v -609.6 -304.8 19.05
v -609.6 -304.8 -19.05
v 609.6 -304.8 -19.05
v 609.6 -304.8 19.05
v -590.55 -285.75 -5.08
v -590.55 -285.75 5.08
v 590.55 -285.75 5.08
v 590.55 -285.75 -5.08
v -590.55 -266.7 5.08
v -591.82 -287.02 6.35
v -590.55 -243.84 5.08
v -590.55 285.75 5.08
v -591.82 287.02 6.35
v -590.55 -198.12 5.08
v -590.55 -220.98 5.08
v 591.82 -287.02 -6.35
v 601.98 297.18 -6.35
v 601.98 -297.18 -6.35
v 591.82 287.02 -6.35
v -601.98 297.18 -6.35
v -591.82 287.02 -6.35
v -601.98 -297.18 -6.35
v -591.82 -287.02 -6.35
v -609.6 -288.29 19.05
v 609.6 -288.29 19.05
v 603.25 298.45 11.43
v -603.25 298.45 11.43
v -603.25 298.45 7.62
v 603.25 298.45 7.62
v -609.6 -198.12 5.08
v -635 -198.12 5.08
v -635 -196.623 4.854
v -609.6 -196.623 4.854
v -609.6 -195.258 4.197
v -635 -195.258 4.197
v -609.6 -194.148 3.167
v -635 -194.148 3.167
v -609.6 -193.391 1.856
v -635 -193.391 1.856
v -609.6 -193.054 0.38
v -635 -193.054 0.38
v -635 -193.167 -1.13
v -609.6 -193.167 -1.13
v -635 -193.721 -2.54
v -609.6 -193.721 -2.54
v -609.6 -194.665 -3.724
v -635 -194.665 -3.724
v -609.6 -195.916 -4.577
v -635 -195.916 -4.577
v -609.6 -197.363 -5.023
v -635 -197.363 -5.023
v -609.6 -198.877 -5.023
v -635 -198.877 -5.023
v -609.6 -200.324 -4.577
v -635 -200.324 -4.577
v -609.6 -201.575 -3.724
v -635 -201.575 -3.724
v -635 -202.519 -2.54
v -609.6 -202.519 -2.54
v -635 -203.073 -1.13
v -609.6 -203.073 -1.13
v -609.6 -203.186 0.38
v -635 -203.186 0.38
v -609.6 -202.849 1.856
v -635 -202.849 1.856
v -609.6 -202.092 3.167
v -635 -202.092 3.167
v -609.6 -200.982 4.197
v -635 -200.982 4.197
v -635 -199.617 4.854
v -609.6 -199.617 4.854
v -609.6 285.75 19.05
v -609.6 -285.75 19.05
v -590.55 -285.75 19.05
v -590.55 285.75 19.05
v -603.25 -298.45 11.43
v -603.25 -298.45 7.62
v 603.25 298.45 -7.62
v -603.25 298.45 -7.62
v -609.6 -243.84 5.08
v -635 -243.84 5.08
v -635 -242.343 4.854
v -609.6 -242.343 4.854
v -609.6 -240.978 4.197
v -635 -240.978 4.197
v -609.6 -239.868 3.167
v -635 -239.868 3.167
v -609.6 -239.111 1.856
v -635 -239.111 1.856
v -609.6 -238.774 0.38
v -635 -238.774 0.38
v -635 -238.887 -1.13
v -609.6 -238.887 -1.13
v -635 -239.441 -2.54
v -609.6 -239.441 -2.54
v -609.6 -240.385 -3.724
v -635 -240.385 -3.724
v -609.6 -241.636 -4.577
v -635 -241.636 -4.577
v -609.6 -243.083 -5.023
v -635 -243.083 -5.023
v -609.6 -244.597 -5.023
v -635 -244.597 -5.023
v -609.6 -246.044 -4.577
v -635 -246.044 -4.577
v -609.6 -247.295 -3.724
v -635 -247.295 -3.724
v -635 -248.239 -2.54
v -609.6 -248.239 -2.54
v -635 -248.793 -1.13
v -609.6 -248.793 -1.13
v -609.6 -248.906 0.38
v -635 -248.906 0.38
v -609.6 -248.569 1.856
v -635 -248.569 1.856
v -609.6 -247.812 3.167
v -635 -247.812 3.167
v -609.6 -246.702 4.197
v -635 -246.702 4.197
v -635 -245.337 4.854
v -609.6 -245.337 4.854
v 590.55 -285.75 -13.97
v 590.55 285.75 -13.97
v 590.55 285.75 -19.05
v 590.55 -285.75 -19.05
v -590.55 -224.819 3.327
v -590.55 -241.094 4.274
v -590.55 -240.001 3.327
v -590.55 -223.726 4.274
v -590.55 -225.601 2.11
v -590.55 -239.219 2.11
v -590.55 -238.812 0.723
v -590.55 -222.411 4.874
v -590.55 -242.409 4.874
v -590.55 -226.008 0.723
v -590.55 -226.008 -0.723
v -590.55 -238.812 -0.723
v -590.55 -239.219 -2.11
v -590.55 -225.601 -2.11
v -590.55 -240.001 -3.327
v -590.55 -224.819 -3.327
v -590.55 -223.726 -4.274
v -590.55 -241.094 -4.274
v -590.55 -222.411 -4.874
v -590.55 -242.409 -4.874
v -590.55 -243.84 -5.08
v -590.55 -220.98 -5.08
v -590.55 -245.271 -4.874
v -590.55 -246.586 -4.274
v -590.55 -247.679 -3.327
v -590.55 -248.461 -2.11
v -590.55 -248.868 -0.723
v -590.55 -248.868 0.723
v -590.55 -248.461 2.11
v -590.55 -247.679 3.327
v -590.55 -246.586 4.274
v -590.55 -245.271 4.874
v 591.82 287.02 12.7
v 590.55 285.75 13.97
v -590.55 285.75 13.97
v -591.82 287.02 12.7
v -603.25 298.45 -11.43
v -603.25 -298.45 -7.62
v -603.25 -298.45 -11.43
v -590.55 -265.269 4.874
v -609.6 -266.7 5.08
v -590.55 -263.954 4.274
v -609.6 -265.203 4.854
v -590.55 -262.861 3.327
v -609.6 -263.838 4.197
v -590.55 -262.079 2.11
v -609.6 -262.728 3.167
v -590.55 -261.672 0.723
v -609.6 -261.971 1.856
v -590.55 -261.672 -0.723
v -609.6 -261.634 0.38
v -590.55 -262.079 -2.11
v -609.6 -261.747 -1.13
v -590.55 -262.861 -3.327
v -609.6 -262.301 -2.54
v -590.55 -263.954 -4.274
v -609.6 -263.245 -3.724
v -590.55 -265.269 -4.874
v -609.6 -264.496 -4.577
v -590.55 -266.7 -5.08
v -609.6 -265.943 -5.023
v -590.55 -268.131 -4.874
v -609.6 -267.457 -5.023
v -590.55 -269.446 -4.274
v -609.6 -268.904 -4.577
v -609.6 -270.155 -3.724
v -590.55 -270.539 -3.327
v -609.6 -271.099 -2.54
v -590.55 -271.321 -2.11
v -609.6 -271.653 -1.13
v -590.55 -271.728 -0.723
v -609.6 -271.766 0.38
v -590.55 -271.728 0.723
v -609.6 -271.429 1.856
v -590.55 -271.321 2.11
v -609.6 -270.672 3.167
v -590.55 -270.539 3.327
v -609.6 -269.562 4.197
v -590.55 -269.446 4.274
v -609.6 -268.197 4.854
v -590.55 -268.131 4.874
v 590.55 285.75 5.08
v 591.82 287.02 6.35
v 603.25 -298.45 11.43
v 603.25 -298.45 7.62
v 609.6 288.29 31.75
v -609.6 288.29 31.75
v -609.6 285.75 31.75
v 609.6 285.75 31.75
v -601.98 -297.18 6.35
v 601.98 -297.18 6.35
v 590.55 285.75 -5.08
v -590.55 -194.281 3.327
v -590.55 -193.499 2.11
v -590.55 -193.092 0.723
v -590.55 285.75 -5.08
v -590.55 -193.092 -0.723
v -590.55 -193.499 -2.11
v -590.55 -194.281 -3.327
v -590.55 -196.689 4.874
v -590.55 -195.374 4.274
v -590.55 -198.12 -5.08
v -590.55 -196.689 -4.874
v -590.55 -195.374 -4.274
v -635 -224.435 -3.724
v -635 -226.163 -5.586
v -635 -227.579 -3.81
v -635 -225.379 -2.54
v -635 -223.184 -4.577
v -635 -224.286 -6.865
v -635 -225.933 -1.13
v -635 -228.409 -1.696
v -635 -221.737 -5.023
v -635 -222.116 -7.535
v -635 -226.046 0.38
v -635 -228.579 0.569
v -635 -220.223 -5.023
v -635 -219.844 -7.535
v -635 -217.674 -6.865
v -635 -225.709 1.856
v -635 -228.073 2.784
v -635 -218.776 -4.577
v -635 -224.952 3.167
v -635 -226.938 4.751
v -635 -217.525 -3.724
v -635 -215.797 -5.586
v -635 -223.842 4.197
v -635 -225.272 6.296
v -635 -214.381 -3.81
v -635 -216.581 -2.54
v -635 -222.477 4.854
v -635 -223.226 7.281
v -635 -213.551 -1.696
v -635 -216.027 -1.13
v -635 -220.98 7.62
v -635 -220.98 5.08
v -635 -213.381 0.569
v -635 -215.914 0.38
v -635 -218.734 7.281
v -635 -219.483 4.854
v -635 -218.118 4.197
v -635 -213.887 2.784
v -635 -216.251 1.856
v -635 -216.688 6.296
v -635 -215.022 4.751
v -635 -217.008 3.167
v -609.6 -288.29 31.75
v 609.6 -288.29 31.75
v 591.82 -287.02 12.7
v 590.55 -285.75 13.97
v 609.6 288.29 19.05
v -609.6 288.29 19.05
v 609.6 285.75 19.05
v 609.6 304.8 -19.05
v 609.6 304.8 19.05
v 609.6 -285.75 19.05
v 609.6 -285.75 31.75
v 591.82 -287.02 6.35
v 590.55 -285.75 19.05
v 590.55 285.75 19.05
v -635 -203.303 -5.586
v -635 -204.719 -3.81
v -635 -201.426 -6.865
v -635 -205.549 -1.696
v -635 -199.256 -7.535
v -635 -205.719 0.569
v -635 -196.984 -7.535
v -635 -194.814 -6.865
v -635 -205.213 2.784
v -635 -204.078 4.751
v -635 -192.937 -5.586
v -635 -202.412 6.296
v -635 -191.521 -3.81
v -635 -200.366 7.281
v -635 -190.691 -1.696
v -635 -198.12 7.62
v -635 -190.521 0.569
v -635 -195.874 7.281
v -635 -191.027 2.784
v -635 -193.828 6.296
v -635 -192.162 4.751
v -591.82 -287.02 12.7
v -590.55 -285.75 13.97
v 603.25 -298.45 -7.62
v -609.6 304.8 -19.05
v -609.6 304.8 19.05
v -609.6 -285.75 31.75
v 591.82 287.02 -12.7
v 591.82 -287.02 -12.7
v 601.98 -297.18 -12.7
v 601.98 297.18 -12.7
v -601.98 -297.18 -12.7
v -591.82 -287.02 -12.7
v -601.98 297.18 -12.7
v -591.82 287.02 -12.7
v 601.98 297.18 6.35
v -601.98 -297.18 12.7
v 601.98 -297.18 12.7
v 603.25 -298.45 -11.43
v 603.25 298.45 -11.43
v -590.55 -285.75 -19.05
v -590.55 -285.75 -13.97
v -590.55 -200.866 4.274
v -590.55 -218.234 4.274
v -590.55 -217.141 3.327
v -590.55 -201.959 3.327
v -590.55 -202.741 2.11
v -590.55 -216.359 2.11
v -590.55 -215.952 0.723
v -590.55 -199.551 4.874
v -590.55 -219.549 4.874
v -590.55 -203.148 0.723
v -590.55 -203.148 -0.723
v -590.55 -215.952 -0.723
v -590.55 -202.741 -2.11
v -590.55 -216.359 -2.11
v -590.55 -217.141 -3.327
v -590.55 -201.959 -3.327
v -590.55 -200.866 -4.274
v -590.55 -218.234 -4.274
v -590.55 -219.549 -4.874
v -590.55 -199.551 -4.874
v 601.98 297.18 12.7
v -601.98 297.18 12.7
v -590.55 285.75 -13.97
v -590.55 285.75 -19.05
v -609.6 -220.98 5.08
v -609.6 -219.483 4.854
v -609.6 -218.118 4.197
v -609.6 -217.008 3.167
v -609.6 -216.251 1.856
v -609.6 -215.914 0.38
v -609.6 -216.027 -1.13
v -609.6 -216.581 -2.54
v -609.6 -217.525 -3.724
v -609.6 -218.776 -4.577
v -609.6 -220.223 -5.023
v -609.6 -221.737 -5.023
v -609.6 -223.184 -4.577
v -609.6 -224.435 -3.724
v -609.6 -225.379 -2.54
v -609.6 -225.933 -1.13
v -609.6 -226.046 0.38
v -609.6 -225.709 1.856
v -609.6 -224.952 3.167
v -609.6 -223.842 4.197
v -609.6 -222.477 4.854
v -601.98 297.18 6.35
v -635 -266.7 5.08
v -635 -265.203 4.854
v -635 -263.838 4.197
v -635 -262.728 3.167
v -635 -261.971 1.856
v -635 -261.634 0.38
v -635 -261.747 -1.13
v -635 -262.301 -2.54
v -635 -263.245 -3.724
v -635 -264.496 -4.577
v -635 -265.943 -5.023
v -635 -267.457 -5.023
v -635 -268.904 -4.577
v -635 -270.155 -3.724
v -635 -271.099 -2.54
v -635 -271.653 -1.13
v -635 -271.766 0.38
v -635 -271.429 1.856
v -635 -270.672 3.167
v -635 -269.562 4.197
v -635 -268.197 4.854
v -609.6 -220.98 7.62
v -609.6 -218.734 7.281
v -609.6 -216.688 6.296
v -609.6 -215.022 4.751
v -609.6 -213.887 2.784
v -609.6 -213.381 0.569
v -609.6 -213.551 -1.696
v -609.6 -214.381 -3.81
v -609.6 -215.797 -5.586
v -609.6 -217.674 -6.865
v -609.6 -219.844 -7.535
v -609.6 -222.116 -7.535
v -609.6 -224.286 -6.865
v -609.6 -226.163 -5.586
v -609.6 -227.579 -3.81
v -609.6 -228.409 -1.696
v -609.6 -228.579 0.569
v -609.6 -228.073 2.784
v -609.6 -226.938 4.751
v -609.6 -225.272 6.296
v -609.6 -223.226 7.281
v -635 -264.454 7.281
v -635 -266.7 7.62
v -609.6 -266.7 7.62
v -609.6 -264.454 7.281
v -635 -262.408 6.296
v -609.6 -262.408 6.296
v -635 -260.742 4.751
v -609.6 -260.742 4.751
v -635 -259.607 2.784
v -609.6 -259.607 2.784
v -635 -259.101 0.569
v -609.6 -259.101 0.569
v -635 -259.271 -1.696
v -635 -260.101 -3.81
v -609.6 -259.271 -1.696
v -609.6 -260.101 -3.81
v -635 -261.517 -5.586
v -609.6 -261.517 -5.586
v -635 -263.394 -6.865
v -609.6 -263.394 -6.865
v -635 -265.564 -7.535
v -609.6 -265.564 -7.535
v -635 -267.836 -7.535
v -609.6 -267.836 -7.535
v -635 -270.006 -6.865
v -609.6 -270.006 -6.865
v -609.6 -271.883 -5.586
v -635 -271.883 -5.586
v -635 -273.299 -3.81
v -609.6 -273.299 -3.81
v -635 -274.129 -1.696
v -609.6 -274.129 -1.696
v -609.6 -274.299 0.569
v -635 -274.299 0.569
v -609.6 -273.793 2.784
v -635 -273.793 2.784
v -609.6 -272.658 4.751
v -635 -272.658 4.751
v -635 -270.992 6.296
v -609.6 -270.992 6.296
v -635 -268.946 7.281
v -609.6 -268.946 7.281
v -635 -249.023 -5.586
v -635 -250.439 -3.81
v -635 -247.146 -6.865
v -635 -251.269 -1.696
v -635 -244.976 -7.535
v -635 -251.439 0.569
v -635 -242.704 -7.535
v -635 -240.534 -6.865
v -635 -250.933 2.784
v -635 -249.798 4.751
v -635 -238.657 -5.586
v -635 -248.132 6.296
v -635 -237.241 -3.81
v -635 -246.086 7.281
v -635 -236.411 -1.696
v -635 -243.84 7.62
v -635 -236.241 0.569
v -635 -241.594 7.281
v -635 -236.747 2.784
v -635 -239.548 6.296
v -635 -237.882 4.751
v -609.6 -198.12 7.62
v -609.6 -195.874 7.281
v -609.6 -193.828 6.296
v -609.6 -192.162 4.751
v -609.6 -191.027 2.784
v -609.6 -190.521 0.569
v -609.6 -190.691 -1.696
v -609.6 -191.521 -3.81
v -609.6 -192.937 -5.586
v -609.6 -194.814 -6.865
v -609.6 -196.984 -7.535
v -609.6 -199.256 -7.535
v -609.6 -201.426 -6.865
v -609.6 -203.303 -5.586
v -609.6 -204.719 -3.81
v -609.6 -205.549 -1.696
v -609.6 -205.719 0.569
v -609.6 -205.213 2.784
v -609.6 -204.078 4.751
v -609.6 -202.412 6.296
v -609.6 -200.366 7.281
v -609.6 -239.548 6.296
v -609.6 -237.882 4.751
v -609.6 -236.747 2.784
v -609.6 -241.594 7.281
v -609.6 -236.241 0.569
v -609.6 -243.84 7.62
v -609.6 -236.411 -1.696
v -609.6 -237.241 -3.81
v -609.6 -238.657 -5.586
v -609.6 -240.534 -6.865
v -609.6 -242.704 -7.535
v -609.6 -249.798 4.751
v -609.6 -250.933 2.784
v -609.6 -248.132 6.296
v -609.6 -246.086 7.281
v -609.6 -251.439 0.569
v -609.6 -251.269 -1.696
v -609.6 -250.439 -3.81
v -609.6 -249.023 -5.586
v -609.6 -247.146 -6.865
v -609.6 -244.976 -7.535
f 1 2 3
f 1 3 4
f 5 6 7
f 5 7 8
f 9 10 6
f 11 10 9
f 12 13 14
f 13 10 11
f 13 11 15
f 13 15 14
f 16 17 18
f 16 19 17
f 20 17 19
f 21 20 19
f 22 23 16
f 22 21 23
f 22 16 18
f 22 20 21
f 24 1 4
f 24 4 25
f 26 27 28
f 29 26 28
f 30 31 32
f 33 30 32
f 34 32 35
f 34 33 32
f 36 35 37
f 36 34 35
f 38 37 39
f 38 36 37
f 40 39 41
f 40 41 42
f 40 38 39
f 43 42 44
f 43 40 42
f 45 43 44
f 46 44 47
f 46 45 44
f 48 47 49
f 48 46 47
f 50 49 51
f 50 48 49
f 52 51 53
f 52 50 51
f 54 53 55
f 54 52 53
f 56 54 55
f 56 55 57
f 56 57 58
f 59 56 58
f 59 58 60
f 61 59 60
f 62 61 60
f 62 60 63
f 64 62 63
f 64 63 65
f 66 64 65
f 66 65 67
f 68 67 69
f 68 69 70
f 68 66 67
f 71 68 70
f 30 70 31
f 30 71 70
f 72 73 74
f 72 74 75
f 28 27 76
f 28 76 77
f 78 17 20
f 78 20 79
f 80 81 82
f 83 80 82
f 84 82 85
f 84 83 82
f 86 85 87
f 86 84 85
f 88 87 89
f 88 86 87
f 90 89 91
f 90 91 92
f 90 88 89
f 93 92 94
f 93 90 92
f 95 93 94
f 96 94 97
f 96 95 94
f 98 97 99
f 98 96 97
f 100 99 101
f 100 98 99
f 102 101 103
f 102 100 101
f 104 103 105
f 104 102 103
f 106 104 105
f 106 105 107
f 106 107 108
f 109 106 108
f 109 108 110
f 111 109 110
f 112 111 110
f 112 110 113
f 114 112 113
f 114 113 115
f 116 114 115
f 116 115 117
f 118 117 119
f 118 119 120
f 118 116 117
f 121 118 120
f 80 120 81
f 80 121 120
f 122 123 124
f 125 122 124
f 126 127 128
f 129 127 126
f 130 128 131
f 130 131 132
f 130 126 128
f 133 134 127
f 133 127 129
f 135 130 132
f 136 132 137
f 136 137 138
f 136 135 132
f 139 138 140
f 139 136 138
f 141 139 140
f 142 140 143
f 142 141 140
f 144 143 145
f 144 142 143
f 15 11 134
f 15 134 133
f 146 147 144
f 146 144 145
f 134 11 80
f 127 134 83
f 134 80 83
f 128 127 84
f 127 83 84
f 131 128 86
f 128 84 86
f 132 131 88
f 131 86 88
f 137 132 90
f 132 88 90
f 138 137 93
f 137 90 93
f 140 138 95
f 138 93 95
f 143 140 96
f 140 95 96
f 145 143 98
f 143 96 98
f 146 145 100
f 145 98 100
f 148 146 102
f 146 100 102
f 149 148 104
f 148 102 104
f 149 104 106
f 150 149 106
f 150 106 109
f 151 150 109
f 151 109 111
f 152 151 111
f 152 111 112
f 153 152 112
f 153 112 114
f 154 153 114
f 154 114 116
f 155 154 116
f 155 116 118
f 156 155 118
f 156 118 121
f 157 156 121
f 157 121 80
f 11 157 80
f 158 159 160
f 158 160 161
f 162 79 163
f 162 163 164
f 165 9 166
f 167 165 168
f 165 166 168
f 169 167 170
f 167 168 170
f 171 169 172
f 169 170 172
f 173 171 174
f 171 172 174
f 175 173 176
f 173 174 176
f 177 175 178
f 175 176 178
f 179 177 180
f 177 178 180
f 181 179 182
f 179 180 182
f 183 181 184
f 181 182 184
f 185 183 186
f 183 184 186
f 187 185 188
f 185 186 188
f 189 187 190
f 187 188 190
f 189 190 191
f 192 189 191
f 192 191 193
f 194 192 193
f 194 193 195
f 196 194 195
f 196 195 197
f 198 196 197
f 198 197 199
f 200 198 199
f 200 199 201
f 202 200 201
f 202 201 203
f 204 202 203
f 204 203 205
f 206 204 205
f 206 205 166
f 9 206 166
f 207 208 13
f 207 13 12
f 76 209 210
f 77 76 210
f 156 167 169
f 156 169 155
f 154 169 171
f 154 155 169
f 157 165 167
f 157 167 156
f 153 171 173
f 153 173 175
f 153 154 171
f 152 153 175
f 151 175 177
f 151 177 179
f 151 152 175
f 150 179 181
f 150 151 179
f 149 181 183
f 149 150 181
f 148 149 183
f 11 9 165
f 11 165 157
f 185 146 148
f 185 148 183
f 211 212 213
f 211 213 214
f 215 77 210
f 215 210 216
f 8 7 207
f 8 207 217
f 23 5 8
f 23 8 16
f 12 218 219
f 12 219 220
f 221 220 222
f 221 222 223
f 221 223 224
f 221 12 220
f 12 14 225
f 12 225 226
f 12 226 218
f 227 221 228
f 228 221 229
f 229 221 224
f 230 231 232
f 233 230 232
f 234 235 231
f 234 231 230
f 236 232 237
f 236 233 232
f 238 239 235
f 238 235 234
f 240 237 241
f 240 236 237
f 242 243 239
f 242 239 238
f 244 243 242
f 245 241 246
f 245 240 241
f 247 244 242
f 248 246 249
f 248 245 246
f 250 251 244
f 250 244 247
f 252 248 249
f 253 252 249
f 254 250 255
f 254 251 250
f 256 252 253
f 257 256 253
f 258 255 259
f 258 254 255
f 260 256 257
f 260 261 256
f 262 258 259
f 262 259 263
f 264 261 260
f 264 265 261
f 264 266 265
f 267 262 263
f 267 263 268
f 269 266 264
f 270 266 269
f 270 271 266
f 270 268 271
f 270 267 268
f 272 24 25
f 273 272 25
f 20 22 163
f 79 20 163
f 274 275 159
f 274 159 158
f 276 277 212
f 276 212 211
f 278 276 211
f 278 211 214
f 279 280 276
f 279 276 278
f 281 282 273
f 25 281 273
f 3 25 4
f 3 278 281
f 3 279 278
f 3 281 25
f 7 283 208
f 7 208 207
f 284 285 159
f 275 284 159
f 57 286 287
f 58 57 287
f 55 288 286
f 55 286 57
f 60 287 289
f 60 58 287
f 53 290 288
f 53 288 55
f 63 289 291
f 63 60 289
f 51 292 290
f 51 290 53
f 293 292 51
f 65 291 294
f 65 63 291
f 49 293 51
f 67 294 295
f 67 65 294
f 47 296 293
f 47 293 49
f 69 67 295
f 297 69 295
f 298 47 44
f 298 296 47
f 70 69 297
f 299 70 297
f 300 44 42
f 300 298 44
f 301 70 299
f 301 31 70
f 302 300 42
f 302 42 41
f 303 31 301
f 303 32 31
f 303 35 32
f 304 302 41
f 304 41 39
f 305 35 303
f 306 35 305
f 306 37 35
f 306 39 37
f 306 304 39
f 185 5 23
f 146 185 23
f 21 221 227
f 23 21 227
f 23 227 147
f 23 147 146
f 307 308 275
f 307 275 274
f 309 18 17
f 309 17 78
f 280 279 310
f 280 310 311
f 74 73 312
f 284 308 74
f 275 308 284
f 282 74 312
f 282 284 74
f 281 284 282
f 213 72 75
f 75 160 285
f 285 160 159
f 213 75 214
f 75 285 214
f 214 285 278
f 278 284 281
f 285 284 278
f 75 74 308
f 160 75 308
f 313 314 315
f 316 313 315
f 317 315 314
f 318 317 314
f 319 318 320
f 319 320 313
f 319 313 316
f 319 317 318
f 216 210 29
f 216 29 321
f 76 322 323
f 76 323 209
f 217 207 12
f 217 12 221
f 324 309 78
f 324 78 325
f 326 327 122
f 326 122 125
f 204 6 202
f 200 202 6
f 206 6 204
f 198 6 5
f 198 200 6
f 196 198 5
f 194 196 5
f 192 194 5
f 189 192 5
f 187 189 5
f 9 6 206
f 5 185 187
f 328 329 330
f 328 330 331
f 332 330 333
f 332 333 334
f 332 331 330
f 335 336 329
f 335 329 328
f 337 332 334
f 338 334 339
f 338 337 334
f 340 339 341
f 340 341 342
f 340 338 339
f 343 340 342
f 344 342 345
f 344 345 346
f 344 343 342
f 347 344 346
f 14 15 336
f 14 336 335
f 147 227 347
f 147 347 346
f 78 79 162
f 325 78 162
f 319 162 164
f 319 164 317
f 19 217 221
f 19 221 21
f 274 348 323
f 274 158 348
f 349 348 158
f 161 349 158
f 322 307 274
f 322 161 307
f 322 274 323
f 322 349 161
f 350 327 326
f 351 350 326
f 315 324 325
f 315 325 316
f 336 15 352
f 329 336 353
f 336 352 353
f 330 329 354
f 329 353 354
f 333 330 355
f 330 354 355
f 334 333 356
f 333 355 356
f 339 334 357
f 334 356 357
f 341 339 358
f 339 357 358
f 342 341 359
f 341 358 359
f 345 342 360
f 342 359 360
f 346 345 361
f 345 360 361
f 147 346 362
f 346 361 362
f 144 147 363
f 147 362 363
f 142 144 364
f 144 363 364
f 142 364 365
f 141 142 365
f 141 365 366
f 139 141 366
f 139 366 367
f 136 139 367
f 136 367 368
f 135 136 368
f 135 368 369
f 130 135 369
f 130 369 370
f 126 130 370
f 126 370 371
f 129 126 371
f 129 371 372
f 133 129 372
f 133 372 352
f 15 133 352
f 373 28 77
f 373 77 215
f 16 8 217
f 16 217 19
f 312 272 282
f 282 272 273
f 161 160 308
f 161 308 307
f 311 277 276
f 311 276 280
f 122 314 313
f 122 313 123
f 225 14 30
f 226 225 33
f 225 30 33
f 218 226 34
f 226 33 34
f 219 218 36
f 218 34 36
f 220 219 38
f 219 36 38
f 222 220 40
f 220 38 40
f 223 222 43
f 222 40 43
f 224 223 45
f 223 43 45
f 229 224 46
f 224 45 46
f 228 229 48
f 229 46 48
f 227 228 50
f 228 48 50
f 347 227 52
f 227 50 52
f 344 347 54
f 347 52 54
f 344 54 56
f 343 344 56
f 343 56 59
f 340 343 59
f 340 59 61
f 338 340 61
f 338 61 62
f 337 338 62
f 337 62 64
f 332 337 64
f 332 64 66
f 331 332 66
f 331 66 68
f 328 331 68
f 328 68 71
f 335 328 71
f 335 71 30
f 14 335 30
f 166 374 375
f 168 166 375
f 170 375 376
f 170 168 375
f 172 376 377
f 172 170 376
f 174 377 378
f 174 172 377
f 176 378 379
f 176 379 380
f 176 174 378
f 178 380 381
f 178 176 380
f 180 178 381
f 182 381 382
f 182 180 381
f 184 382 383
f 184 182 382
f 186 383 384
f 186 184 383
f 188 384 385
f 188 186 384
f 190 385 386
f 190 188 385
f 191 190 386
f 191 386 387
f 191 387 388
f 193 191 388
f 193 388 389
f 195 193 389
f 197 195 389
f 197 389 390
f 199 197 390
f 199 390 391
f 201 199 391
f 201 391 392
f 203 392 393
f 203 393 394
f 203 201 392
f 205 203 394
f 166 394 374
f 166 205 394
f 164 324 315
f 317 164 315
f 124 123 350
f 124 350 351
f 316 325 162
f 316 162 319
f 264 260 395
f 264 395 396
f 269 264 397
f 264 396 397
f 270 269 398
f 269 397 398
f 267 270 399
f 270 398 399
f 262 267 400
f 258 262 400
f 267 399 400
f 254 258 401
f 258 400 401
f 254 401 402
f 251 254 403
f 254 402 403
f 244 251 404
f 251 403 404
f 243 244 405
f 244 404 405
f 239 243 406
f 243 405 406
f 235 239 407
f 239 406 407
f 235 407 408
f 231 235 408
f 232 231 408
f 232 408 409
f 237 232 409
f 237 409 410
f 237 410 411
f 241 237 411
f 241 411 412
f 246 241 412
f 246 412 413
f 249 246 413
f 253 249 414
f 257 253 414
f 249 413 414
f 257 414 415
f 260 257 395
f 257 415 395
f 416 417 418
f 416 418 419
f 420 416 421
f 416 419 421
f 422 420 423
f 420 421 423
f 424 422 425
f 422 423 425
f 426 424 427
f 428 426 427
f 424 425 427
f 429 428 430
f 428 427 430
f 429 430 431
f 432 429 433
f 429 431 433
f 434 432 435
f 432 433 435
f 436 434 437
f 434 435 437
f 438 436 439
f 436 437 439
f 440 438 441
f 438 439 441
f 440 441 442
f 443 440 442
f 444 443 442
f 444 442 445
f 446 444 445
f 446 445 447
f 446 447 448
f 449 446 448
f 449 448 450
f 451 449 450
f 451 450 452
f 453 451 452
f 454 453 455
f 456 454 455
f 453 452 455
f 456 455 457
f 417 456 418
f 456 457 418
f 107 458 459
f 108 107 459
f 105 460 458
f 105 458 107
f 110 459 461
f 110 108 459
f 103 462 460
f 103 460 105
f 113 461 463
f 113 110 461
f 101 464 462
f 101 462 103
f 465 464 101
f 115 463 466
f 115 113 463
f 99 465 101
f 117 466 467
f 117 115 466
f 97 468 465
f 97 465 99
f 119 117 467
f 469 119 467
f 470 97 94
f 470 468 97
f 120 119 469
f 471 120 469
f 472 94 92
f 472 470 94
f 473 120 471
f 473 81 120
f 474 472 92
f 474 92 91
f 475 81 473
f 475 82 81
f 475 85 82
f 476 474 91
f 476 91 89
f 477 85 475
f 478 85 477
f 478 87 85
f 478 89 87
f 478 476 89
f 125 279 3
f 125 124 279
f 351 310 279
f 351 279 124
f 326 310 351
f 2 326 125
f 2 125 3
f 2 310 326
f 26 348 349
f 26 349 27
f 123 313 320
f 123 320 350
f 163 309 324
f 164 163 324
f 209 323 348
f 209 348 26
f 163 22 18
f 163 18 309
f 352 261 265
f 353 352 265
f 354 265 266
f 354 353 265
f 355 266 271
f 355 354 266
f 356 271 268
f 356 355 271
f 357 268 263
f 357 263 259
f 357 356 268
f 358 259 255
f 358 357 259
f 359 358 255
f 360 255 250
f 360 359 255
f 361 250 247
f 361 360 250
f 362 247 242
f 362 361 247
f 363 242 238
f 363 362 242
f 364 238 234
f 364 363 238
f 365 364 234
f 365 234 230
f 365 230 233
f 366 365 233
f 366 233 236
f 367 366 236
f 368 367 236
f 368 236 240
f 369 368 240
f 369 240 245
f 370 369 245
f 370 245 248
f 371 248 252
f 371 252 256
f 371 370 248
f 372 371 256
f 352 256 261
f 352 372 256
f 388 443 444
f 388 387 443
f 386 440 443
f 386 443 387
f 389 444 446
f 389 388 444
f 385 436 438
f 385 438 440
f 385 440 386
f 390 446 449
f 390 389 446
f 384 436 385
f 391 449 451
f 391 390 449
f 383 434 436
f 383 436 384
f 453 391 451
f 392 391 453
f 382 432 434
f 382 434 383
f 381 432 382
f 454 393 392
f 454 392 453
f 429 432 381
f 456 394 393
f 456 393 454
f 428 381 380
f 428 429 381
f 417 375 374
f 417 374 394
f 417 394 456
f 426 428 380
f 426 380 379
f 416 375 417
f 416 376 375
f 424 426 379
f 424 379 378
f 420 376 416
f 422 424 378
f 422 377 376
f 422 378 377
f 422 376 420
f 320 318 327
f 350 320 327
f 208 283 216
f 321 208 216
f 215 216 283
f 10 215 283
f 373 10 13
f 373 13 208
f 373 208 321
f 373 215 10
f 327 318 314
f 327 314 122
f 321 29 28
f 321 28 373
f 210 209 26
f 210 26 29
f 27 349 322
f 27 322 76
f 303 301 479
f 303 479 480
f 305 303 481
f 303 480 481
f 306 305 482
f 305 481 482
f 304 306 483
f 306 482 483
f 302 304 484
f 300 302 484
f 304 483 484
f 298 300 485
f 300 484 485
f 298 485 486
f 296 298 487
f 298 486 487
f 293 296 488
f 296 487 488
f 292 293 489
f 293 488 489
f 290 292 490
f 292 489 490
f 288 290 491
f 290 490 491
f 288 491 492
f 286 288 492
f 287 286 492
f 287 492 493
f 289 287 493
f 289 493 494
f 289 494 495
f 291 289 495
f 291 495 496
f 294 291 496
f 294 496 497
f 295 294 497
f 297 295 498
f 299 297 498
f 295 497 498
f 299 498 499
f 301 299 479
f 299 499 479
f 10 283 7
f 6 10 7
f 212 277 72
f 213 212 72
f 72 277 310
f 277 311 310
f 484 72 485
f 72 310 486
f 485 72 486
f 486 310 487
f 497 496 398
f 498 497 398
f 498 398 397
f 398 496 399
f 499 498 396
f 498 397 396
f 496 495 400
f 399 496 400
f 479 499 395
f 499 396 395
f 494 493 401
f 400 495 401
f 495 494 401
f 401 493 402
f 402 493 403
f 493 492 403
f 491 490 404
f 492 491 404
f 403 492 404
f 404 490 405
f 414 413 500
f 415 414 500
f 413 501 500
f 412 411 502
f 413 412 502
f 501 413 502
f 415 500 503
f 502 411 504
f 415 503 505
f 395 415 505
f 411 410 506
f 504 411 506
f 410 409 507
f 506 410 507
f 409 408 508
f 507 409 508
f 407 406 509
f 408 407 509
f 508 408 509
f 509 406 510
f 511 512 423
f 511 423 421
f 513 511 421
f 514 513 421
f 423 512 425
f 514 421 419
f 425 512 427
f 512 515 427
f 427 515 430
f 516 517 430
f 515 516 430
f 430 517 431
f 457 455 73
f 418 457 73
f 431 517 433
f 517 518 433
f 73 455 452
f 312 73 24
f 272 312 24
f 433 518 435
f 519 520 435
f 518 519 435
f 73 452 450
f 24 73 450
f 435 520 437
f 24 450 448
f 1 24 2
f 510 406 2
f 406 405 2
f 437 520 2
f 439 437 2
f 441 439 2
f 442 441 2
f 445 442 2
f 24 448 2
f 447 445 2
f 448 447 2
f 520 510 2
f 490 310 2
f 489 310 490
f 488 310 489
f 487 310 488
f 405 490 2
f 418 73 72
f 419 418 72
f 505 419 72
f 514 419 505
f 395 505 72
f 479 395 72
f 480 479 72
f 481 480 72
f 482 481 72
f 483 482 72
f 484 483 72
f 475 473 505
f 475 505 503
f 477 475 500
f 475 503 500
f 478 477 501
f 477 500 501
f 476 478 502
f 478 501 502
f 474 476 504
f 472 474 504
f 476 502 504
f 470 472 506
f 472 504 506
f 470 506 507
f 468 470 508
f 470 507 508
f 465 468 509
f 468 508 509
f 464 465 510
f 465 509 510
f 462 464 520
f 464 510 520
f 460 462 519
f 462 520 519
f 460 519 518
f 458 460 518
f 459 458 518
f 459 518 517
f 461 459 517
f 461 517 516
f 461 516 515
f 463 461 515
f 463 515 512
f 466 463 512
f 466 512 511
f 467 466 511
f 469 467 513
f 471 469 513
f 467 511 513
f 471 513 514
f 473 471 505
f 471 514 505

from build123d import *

# Parameters (mm, degrees)
CUT_EXTRUDE4_REACH  = 1221.2
SKETCH4_R           = 5.08
SKETCH5_R           = 7.62
SKETCH5_R_2         = 5.08
BOSS_EXTRUDE3_DEPTH = 25.4
SKETCH7_W           = 1219.2
SKETCH7_H           = 2.54
BOSS_EXTRUDE4_DEPTH = 12.7


with BuildPart() as part:
    # Sweep1: sweep along a path in Sketch2
    with BuildLine(Plane.XY) as sweep1_path:
        Line((609.6, -304.8), (-609.6, -304.8))
        Line((-609.6, -304.8), (-609.6, 304.8))
        Line((-609.6, 304.8), (609.6, 304.8))
        Line((609.6, 304.8), (609.6, -304.8))
    # Sketch3 → Sweep1 (sweep)
    with BuildSketch(Plane(origin=(0, 0, 0), x_dir=(0, 0, -1), z_dir=(1, 0, 0))):
        Polygon((-19.05, 304.8), (19.05, 304.8), (19.05, 285.75), (13.97, 285.75), (12.7, 287.02), (12.7, 297.18), (11.43, 298.45), (7.62, 298.45), (6.35, 297.18), (6.35, 287.02), (5.08, 285.75), (-5.08, 285.75), (-6.35, 287.02), (-6.35, 297.18), (-7.62, 298.45), (-11.43, 298.45), (-12.7, 297.18), (-12.7, 287.02), (-13.97, 285.75), (-19.05, 285.75), align=None)
    sweep(path=sweep1_path.line, transition=Transition.RIGHT)

    # Sketch4 → Cut-Extrude4 (cut, up to next)
    with BuildSketch(Plane.ZY.offset(609.6), mode=Mode.PRIVATE) as cut_extrude4_sk1:
        with Locations((0, -266.7)):
            Circle(SKETCH4_R)
    cut_extrude4_tool1 = extrude(cut_extrude4_sk1.sketch, amount=-CUT_EXTRUDE4_REACH, mode=Mode.PRIVATE) & part.part
    add(cut_extrude4_tool1.solids().sort_by_distance((-609.6, -266.7, 0))[0], mode=Mode.SUBTRACT)
    # Sketch4 → Cut-Extrude4 (cut, up to next)
    with BuildSketch(Plane.ZY.offset(609.6), mode=Mode.PRIVATE) as cut_extrude4_sk2:
        with Locations((0, -243.84)):
            Circle(SKETCH4_R)
    cut_extrude4_tool2 = extrude(cut_extrude4_sk2.sketch, amount=-CUT_EXTRUDE4_REACH, mode=Mode.PRIVATE) & part.part
    add(cut_extrude4_tool2.solids().sort_by_distance((-609.6, -243.84, 0))[0], mode=Mode.SUBTRACT)
    # Sketch4 → Cut-Extrude4 (cut, up to next)
    with BuildSketch(Plane.ZY.offset(609.6), mode=Mode.PRIVATE) as cut_extrude4_sk3:
        with Locations((0, -220.98)):
            Circle(SKETCH4_R)
    cut_extrude4_tool3 = extrude(cut_extrude4_sk3.sketch, amount=-CUT_EXTRUDE4_REACH, mode=Mode.PRIVATE) & part.part
    add(cut_extrude4_tool3.solids().sort_by_distance((-609.6, -220.98, 0))[0], mode=Mode.SUBTRACT)
    # Sketch4 → Cut-Extrude4 (cut, up to next)
    with BuildSketch(Plane.ZY.offset(609.6), mode=Mode.PRIVATE) as cut_extrude4_sk4:
        with Locations((0, -198.12)):
            Circle(SKETCH4_R)
    cut_extrude4_tool4 = extrude(cut_extrude4_sk4.sketch, amount=-CUT_EXTRUDE4_REACH, mode=Mode.PRIVATE) & part.part
    add(cut_extrude4_tool4.solids().sort_by_distance((-609.6, -198.12, 0))[0], mode=Mode.SUBTRACT)

    # Sketch5 → Boss-Extrude3 (add)
    with BuildSketch(Plane.ZY.offset(609.6)):
        with Locations((0, -198.12)):
            Circle(SKETCH5_R)
        with Locations((0, -198.12)):
            Circle(SKETCH5_R_2, mode=Mode.SUBTRACT)
        with Locations((0, -220.98)):
            Circle(SKETCH5_R)
        with Locations((0, -220.98)):
            Circle(SKETCH5_R_2, mode=Mode.SUBTRACT)
        with Locations((0, -243.84)):
            Circle(SKETCH5_R)
        with Locations((0, -243.84)):
            Circle(SKETCH5_R_2, mode=Mode.SUBTRACT)
        with Locations((0, -266.7)):
            Circle(SKETCH5_R)
        with Locations((0, -266.7)):
            Circle(SKETCH5_R_2, mode=Mode.SUBTRACT)
    extrude(amount=BOSS_EXTRUDE3_DEPTH)

    # Sketch7 → Boss-Extrude4 (add)
    with BuildSketch(Plane.XY.offset(19.05)):
        with Locations((0, 287.02)):
            Rectangle(SKETCH7_W, SKETCH7_H)
    boss_extrude4 = extrude(amount=BOSS_EXTRUDE4_DEPTH)

    # Mirror1: Boss-Extrude4 across plane
    add(boss_extrude4.mirror(Plane.ZX))


solid = part.part
